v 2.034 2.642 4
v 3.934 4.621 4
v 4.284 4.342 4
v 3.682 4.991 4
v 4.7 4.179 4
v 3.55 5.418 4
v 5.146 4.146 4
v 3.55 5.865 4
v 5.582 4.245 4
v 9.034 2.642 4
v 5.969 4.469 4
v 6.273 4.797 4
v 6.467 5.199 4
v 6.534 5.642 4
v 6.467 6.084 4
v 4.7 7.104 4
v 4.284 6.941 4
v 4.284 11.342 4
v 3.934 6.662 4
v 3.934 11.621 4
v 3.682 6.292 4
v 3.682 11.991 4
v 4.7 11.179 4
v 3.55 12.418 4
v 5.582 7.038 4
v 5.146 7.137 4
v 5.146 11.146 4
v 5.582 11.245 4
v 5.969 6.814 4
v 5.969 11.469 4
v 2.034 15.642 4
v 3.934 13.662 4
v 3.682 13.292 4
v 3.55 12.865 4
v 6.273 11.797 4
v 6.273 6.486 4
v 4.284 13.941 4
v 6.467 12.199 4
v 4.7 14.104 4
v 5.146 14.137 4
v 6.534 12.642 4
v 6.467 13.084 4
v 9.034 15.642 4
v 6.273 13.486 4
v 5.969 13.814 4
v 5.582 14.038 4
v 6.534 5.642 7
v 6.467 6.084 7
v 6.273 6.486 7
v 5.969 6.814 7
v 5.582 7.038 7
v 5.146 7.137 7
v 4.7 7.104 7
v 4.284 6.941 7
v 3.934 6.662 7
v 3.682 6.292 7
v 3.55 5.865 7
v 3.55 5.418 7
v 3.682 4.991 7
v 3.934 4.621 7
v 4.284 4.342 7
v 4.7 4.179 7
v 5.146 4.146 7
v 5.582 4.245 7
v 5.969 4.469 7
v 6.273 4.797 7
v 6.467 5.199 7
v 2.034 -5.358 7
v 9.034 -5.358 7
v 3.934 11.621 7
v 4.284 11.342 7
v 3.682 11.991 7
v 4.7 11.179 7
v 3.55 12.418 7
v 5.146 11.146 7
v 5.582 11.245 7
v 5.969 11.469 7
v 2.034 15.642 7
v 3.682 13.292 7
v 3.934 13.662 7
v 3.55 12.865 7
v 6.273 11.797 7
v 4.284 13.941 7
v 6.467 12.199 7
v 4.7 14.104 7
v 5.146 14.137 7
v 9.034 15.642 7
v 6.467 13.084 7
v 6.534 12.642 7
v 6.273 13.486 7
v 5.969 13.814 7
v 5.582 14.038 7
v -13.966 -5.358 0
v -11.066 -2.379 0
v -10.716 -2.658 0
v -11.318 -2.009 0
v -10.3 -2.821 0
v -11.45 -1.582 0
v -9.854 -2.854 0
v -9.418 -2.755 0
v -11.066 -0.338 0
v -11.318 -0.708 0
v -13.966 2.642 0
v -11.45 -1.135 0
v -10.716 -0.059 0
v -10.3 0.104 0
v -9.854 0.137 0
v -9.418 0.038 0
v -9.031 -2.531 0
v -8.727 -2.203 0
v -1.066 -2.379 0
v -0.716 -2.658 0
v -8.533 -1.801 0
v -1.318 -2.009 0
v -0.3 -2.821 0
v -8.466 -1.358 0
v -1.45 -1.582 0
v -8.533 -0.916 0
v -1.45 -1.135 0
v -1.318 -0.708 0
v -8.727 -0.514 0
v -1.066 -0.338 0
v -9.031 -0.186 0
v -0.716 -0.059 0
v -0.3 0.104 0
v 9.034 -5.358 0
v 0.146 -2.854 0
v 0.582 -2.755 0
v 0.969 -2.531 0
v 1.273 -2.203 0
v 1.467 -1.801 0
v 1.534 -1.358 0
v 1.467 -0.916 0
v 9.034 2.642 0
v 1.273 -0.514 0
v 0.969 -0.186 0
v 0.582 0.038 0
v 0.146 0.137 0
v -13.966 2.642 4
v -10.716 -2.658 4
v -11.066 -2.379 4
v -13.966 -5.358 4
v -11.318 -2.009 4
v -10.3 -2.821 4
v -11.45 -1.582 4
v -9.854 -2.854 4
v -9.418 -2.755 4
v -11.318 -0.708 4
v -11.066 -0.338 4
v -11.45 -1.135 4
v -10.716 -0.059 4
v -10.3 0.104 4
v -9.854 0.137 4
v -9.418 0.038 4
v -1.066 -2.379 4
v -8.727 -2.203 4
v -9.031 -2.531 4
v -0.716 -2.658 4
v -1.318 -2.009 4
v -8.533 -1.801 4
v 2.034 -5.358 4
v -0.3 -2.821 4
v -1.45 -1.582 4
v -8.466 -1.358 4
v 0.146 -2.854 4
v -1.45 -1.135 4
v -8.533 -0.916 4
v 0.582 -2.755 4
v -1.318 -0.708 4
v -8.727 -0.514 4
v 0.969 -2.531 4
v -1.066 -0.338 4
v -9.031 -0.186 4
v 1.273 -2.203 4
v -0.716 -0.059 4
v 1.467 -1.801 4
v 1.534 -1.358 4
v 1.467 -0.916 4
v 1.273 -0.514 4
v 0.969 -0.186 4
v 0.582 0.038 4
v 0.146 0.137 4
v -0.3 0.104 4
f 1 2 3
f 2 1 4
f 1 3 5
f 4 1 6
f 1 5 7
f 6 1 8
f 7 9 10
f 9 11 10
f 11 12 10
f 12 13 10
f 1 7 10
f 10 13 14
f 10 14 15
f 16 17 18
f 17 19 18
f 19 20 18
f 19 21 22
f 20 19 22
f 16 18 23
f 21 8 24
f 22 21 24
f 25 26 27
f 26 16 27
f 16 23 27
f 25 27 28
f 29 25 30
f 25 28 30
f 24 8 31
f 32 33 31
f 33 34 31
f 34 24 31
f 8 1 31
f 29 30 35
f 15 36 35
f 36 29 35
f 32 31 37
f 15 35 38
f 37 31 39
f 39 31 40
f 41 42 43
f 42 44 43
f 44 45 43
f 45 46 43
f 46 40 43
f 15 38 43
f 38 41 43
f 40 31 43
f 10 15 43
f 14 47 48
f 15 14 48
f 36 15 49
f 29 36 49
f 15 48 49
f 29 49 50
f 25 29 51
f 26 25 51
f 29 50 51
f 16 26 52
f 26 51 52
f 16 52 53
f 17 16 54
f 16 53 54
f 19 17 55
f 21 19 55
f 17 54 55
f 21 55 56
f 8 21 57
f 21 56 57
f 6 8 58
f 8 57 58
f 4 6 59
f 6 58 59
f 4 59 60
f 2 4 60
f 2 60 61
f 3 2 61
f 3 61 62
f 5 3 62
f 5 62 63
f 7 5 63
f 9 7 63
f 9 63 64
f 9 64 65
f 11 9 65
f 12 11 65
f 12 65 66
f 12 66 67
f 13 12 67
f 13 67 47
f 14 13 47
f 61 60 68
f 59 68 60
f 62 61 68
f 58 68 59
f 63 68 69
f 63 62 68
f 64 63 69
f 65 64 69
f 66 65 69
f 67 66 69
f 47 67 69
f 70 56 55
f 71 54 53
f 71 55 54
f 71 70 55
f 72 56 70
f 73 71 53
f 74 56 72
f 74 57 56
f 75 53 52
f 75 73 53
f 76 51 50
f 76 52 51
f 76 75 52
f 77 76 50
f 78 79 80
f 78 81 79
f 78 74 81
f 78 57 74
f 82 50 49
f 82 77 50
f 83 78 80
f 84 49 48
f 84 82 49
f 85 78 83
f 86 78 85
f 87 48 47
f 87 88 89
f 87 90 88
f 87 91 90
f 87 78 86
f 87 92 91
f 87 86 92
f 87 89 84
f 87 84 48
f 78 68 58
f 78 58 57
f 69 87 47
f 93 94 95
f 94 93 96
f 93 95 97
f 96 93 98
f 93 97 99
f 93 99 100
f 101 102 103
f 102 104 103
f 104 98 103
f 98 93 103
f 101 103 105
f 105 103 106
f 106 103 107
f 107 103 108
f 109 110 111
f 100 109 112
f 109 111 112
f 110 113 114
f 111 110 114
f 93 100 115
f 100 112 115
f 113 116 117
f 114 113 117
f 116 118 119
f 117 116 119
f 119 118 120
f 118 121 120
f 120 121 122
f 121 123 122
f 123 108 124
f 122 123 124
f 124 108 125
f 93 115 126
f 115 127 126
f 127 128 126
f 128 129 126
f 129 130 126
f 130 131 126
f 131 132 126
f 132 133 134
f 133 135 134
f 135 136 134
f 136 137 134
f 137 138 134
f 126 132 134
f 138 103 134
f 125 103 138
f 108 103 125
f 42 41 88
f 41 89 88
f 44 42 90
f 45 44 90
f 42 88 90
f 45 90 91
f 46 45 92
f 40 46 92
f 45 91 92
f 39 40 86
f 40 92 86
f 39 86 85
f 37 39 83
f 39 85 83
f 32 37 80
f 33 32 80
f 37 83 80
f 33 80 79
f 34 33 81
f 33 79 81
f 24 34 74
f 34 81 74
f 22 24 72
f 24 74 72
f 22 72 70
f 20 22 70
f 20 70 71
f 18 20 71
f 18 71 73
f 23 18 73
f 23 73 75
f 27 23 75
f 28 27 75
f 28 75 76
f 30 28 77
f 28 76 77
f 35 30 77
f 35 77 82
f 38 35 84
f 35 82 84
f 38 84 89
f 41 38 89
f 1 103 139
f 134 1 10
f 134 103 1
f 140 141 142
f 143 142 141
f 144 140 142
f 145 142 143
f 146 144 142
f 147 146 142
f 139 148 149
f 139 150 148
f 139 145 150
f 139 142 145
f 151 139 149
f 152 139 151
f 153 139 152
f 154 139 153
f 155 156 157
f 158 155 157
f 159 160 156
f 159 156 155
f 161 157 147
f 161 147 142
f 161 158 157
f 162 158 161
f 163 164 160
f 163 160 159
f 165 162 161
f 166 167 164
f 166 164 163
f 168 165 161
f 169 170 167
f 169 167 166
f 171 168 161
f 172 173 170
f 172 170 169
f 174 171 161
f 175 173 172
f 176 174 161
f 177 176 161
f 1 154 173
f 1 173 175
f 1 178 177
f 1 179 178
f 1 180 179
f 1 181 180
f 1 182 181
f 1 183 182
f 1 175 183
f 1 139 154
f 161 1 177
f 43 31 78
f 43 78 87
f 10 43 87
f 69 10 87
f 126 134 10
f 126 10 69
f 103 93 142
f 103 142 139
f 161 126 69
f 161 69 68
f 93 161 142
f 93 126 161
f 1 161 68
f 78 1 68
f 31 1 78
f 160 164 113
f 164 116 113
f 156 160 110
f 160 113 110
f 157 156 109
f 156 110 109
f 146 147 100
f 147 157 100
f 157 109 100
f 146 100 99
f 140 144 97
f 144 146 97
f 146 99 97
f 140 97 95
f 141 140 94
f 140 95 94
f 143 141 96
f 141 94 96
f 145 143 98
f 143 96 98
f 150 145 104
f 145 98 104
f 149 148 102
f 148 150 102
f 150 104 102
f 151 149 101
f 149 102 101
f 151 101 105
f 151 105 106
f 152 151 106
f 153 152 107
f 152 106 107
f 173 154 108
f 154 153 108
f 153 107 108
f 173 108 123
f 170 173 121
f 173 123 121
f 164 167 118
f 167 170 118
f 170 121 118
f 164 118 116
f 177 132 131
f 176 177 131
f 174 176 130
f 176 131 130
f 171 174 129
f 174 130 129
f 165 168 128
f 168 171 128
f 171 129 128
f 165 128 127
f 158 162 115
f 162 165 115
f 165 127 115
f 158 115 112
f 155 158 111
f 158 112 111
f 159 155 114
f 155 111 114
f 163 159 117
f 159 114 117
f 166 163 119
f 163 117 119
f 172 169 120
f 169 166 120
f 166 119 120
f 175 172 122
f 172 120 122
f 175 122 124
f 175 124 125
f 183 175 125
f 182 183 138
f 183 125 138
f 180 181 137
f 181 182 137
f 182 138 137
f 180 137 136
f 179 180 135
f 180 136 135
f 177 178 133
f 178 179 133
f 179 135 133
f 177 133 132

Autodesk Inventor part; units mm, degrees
ref_plane "YZ Plane" through (0, 0, 0) normal (1, 0, 0) x (0, 1, 0)
ref_plane "XZ Plane" through (0, 0, 0) normal (0, 1, 0) x (-1, 0, 0)
ref_plane "XY Plane" through (0, 0, 0) normal (0, 0, 1) x (1, 0, 0)
sketch "Boceto1" plane through (0, 0, 0) normal (0, 0, 1) x (1, 0, 0)
  line L0 (-13.9664, 2.6415) -> (9.0336, 2.6415)
  line L1 (9.0336, 2.6415) -> (9.0336, -5.3585)
  line L2 (9.0336, -5.3585) -> (-13.9664, -5.3585)
  line L3 (-13.9664, -5.3585) -> (-13.9664, 2.6415)
  circle A0 centre (-9.9664, -1.3585) radius 1.5
  circle A1 centre (0.0336, -1.3585) radius 1.5
  point P0 (0, 0)
  dimension "d0" = 3
  dimension "d1" = 3
  dimension "d2" = 23
  dimension "d3" = 8
  dimension "d4" = 10
  dimension "d8" = 4
  dimension "d9" = 4
  dimension "d10" = 4
extrude "Extrusión1" add sketch "Boceto1" along normal blind 4
sketch "Boceto2" plane through (0, 0, 4) normal (0, 0, 1) x (1, 0, 0)
  line L0 (-13.9664, -5.3585) -> (9.0336, -5.3585) projected
  line L1 (9.0336, -5.3585) -> (2.0336, -5.3585)
  line L2 (2.0336, -5.3585) -> (2.0336, 15.6415)
  line L3 (2.0336, 15.6415) -> (9.0336, 15.6415)
  line L4 (9.0336, 15.6415) -> (9.0336, -5.3585)
  point P0 (0, 0)
  dimension "d11" = 7
  dimension "d12" = 21
extrude "Extrusión2" add sketch "Boceto2" along normal blind 3
sketch "Boceto3" plane through (0, 0, 7) normal (0, 0, 1) x (1, 0, 0)
  circle A0 centre (5.0336, 5.6415) radius 1.5
  circle A1 centre (5.0336, 12.6415) radius 1.5
  line L0 (2.0336, 2.6415) -> (-13.9664, 2.6415) projected
  line L1 (2.0336, 15.6415) -> (2.0336, -5.3585) projected
  point P0 (0, 0)
  dimension "d15" = 7
  dimension "d16" = 3
  dimension "d17" = 3
  dimension "d18" = 3
  dimension "d19" = 3
  dimension "d20" = 3
extrude "Extrusión3" cut sketch "Boceto3" against normal up to surface (3 mm away)
equation "\"d1\" = d0"
equation "\"d9\" = 0.5 * d3"
equation "\"d10\" = d9"
equation "\"d18\" = d17"
equation "\"d20\" = d19"
properties part number "Soporte Switch X Izq" material "Acero, fundido"
